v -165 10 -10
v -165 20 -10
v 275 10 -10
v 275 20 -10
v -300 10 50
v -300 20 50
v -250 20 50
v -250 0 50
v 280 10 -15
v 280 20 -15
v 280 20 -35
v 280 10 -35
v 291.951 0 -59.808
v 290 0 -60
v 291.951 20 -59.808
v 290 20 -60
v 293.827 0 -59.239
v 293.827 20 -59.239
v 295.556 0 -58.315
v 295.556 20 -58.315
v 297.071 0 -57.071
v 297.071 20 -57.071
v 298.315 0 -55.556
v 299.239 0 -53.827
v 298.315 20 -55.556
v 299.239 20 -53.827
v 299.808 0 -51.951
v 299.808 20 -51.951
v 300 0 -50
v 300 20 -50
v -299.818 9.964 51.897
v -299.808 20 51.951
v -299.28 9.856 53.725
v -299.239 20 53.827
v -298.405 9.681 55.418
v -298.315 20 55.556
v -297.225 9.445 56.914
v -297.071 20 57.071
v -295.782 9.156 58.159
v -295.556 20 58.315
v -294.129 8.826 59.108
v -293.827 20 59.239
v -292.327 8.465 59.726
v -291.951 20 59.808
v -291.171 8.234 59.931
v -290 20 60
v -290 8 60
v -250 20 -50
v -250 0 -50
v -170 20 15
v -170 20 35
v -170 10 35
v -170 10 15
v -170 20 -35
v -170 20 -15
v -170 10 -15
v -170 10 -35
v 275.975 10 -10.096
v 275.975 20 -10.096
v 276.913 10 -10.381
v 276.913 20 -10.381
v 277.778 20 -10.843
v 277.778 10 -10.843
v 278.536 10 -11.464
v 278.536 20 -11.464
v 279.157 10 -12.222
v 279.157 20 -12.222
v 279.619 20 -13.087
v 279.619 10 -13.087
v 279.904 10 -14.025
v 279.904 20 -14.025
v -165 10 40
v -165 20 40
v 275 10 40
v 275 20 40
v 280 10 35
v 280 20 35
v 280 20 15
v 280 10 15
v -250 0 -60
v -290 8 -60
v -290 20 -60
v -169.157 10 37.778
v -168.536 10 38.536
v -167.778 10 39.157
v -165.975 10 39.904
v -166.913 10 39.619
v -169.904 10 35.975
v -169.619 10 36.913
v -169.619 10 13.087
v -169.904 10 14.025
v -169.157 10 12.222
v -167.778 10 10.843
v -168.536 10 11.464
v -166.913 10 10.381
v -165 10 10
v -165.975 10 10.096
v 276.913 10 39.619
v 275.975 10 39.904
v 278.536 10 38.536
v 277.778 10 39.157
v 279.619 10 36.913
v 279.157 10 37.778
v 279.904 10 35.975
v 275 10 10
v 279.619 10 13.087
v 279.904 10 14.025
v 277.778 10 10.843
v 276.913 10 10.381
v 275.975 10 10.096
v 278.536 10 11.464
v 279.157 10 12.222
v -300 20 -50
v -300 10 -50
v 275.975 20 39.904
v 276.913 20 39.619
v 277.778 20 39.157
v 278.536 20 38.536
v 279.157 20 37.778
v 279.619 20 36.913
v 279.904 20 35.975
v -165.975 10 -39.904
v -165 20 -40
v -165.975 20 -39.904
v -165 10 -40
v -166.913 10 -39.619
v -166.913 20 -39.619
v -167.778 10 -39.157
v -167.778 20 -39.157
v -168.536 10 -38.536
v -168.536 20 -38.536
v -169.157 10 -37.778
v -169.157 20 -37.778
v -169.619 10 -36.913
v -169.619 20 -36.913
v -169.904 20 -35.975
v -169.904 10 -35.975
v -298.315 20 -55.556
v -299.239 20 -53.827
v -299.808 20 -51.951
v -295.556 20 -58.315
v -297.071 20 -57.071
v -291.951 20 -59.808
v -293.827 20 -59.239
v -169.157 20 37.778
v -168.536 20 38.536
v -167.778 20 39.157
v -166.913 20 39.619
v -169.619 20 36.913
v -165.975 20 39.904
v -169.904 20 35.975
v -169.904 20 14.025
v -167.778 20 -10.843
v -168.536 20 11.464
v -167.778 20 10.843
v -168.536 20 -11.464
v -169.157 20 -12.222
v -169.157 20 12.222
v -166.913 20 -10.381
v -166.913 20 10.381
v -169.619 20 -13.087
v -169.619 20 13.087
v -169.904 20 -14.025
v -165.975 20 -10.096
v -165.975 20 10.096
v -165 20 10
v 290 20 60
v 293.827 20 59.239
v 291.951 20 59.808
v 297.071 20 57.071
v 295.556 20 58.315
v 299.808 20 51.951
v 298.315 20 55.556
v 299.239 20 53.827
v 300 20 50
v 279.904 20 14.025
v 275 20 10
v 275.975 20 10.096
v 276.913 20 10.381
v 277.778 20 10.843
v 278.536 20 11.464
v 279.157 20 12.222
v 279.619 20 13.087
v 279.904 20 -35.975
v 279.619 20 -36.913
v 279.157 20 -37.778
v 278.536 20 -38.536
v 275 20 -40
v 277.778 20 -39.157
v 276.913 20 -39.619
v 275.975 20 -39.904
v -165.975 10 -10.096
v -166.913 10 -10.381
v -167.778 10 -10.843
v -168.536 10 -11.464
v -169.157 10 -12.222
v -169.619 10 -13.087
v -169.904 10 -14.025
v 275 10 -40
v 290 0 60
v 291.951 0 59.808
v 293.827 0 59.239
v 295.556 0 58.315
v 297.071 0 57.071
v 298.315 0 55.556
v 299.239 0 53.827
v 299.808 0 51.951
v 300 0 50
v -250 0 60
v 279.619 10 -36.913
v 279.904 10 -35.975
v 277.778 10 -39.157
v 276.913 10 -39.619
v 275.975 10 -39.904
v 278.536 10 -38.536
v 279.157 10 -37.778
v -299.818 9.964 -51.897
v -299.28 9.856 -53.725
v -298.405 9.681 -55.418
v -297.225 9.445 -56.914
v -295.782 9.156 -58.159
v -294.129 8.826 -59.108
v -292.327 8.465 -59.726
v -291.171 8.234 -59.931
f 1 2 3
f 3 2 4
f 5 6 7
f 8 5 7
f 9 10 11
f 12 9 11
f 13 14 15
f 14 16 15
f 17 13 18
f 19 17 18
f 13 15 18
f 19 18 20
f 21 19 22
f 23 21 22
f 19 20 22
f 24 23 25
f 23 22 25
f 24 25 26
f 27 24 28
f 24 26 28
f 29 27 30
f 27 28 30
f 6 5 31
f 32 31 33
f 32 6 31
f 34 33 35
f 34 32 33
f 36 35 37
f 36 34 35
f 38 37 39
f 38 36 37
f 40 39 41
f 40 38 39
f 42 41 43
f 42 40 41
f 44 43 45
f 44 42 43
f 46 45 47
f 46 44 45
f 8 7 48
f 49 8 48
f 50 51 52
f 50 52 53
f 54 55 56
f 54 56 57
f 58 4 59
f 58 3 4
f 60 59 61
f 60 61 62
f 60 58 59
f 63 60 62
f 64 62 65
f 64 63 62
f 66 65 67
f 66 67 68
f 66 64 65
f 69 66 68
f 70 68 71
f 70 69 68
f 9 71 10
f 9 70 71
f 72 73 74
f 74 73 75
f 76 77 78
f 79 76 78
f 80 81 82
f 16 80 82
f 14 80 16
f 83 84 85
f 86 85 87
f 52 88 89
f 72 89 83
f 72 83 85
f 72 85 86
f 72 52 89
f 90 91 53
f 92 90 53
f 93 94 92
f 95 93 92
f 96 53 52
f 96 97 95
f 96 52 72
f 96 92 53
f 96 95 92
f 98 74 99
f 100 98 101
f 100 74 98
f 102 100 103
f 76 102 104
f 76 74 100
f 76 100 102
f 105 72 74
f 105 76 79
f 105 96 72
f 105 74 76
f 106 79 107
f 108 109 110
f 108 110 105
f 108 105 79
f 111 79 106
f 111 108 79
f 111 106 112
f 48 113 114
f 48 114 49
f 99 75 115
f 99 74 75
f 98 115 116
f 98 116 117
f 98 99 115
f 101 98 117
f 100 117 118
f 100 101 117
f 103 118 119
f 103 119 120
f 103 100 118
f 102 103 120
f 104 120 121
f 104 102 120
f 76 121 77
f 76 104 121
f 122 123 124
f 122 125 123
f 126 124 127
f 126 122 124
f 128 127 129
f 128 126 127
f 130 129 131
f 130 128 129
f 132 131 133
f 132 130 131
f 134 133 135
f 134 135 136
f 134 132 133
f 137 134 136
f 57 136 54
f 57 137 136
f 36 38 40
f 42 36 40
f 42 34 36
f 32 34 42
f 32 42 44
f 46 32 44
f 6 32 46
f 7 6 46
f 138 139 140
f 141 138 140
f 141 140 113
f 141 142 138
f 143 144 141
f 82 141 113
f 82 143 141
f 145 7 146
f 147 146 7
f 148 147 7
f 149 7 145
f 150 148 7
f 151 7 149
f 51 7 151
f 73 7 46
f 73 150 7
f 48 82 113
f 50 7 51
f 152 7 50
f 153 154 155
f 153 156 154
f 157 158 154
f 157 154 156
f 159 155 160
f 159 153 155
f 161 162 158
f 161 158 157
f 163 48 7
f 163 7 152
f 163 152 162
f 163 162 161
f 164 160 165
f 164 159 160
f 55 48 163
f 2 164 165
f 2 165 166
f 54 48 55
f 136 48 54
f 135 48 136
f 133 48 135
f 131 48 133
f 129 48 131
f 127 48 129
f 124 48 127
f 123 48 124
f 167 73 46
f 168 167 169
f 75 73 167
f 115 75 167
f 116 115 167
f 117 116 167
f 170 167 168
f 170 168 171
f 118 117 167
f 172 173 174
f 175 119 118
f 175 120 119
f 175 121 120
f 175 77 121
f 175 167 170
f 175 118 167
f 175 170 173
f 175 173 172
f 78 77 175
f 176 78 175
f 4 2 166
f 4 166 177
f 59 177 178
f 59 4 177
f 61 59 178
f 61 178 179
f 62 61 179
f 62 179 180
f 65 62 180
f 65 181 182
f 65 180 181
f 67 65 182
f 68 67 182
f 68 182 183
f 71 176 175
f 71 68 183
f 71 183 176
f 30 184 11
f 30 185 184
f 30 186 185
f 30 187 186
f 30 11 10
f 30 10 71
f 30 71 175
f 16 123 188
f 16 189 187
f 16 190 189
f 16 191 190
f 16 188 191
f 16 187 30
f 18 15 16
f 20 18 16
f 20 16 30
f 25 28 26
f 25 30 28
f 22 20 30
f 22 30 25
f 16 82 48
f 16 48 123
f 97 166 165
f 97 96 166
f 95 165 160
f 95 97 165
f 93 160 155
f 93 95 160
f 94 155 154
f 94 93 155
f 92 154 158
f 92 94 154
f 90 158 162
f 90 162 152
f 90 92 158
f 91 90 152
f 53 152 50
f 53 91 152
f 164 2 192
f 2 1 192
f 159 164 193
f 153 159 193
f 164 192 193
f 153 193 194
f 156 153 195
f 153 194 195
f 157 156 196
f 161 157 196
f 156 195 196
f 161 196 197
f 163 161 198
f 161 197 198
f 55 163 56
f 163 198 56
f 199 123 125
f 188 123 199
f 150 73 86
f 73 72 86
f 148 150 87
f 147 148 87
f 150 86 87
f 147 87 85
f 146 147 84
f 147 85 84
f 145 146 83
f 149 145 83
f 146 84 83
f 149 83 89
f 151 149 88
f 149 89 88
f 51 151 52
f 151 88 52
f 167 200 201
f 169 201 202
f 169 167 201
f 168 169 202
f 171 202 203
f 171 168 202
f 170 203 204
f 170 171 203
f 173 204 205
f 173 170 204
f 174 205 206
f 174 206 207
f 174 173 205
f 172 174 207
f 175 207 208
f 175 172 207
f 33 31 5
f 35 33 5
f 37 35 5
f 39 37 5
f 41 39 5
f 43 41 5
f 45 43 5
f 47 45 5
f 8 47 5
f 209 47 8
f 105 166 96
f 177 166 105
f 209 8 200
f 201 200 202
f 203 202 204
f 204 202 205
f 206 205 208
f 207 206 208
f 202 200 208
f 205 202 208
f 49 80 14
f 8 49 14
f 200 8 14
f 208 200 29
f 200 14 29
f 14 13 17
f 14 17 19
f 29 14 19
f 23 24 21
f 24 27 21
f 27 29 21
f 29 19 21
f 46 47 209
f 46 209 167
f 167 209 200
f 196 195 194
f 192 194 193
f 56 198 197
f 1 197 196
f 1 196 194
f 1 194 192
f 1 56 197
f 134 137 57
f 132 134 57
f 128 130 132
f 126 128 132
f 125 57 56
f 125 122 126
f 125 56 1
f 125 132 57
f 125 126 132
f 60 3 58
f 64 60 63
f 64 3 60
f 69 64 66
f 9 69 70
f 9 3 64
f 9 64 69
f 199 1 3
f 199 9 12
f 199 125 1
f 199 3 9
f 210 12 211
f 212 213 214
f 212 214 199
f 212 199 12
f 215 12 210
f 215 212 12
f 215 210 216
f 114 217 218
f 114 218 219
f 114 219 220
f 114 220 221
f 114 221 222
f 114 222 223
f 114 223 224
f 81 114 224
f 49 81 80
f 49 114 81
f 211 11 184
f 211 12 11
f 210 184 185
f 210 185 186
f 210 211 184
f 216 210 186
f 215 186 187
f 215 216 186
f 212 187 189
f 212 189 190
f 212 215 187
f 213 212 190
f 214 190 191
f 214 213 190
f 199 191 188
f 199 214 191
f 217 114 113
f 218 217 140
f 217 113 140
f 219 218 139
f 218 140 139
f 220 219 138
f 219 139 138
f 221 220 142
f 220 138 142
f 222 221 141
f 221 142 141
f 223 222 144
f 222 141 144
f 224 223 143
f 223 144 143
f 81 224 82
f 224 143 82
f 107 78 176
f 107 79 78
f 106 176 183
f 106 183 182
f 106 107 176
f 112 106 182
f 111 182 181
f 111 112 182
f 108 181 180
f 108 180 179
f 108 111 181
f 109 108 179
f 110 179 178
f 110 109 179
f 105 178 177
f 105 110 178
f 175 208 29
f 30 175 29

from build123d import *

# Parameters (mm, degrees)
SKETCH1_W           = 600
SKETCH1_H           = 120
BOSS_EXTRUDE1_DEPTH = 20
CUT_EXTRUDE1_REACH  = 325.728
SKETCH6_W           = 450
SKETCH6_H           = 30
CUT_EXTRUDE2_DEPTH  = 10
FILLET1_R           = 10
FILLET2_R           = 5
CUT_EXTRUDE3_REACH  = 308.594
SKETCH7_W           = 50
SKETCH7_H           = 100


with BuildPart() as part:
    # Sketch1 → Boss-Extrude1 (new body)
    with BuildSketch(Plane(origin=(0, 0, 0), x_dir=(1, 0, 0), z_dir=(0, 1, 0))):
        Rectangle(SKETCH1_W, SKETCH1_H)
    extrude(amount=BOSS_EXTRUDE1_DEPTH)

    # Sketch4 → Cut-Extrude1 (cut, up to next)
    with BuildSketch(Plane.XY.offset(60), mode=Mode.PRIVATE) as cut_extrude1_sk1:
        Polygon((-300, 10), (-250, 0), (-300, 0), align=None)
    cut_extrude1_tool1 = extrude(cut_extrude1_sk1.sketch, amount=-CUT_EXTRUDE1_REACH, mode=Mode.PRIVATE) & part.part
    add(cut_extrude1_tool1.solids().sort_by_distance((-283.333333, 3.333333, 60))[0], mode=Mode.SUBTRACT)

    # Sketch6 → Cut-Extrude2 (cut)
    with BuildSketch(Plane(origin=(0, 20, 0), x_dir=(1, 0, 0), z_dir=(0, 1, 0))):
        with Locations((55, 25)):
            Rectangle(SKETCH6_W, SKETCH6_H)
        with Locations((55, -25)):
            Rectangle(SKETCH6_W, SKETCH6_H)
    extrude(amount=-CUT_EXTRUDE2_DEPTH, mode=Mode.SUBTRACT)

    # Fillet1
    fillet1_edges = [part.edges().sort_by_distance(p)[0] for p in [
        (-300, 15, -60),
        (300, 10, -60),
        (300, 10, 60),
        (-300, 15, 60),
    ]]
    fillet(fillet1_edges, radius=FILLET1_R)

    # Fillet2
    fillet2_edges = [part.edges().sort_by_distance(p)[0] for p in [
        (-170, 15, -10),
        (-170, 15, -40),
        (280, 15, -40),
        (280, 15, -10),
        (-170, 15, 40),
        (-170, 15, 10),
        (280, 15, 10),
        (280, 15, 40),
    ]]
    fillet(fillet2_edges, radius=FILLET2_R)

    # Sketch7 → Cut-Extrude3 (cut, up to next)
    with BuildSketch(Plane(origin=(0, 20, 0), x_dir=(1, 0, 0), z_dir=(0, 1, 0)), mode=Mode.PRIVATE) as cut_extrude3_sk1:
        with Locations((-275, 0)):
            Rectangle(SKETCH7_W, SKETCH7_H)
    cut_extrude3_tool1 = extrude(cut_extrude3_sk1.sketch, amount=-CUT_EXTRUDE3_REACH, mode=Mode.PRIVATE) & part.part
    add(cut_extrude3_tool1.solids().sort_by_distance((-275, 20, 0))[0], mode=Mode.SUBTRACT)


solid = part.part
